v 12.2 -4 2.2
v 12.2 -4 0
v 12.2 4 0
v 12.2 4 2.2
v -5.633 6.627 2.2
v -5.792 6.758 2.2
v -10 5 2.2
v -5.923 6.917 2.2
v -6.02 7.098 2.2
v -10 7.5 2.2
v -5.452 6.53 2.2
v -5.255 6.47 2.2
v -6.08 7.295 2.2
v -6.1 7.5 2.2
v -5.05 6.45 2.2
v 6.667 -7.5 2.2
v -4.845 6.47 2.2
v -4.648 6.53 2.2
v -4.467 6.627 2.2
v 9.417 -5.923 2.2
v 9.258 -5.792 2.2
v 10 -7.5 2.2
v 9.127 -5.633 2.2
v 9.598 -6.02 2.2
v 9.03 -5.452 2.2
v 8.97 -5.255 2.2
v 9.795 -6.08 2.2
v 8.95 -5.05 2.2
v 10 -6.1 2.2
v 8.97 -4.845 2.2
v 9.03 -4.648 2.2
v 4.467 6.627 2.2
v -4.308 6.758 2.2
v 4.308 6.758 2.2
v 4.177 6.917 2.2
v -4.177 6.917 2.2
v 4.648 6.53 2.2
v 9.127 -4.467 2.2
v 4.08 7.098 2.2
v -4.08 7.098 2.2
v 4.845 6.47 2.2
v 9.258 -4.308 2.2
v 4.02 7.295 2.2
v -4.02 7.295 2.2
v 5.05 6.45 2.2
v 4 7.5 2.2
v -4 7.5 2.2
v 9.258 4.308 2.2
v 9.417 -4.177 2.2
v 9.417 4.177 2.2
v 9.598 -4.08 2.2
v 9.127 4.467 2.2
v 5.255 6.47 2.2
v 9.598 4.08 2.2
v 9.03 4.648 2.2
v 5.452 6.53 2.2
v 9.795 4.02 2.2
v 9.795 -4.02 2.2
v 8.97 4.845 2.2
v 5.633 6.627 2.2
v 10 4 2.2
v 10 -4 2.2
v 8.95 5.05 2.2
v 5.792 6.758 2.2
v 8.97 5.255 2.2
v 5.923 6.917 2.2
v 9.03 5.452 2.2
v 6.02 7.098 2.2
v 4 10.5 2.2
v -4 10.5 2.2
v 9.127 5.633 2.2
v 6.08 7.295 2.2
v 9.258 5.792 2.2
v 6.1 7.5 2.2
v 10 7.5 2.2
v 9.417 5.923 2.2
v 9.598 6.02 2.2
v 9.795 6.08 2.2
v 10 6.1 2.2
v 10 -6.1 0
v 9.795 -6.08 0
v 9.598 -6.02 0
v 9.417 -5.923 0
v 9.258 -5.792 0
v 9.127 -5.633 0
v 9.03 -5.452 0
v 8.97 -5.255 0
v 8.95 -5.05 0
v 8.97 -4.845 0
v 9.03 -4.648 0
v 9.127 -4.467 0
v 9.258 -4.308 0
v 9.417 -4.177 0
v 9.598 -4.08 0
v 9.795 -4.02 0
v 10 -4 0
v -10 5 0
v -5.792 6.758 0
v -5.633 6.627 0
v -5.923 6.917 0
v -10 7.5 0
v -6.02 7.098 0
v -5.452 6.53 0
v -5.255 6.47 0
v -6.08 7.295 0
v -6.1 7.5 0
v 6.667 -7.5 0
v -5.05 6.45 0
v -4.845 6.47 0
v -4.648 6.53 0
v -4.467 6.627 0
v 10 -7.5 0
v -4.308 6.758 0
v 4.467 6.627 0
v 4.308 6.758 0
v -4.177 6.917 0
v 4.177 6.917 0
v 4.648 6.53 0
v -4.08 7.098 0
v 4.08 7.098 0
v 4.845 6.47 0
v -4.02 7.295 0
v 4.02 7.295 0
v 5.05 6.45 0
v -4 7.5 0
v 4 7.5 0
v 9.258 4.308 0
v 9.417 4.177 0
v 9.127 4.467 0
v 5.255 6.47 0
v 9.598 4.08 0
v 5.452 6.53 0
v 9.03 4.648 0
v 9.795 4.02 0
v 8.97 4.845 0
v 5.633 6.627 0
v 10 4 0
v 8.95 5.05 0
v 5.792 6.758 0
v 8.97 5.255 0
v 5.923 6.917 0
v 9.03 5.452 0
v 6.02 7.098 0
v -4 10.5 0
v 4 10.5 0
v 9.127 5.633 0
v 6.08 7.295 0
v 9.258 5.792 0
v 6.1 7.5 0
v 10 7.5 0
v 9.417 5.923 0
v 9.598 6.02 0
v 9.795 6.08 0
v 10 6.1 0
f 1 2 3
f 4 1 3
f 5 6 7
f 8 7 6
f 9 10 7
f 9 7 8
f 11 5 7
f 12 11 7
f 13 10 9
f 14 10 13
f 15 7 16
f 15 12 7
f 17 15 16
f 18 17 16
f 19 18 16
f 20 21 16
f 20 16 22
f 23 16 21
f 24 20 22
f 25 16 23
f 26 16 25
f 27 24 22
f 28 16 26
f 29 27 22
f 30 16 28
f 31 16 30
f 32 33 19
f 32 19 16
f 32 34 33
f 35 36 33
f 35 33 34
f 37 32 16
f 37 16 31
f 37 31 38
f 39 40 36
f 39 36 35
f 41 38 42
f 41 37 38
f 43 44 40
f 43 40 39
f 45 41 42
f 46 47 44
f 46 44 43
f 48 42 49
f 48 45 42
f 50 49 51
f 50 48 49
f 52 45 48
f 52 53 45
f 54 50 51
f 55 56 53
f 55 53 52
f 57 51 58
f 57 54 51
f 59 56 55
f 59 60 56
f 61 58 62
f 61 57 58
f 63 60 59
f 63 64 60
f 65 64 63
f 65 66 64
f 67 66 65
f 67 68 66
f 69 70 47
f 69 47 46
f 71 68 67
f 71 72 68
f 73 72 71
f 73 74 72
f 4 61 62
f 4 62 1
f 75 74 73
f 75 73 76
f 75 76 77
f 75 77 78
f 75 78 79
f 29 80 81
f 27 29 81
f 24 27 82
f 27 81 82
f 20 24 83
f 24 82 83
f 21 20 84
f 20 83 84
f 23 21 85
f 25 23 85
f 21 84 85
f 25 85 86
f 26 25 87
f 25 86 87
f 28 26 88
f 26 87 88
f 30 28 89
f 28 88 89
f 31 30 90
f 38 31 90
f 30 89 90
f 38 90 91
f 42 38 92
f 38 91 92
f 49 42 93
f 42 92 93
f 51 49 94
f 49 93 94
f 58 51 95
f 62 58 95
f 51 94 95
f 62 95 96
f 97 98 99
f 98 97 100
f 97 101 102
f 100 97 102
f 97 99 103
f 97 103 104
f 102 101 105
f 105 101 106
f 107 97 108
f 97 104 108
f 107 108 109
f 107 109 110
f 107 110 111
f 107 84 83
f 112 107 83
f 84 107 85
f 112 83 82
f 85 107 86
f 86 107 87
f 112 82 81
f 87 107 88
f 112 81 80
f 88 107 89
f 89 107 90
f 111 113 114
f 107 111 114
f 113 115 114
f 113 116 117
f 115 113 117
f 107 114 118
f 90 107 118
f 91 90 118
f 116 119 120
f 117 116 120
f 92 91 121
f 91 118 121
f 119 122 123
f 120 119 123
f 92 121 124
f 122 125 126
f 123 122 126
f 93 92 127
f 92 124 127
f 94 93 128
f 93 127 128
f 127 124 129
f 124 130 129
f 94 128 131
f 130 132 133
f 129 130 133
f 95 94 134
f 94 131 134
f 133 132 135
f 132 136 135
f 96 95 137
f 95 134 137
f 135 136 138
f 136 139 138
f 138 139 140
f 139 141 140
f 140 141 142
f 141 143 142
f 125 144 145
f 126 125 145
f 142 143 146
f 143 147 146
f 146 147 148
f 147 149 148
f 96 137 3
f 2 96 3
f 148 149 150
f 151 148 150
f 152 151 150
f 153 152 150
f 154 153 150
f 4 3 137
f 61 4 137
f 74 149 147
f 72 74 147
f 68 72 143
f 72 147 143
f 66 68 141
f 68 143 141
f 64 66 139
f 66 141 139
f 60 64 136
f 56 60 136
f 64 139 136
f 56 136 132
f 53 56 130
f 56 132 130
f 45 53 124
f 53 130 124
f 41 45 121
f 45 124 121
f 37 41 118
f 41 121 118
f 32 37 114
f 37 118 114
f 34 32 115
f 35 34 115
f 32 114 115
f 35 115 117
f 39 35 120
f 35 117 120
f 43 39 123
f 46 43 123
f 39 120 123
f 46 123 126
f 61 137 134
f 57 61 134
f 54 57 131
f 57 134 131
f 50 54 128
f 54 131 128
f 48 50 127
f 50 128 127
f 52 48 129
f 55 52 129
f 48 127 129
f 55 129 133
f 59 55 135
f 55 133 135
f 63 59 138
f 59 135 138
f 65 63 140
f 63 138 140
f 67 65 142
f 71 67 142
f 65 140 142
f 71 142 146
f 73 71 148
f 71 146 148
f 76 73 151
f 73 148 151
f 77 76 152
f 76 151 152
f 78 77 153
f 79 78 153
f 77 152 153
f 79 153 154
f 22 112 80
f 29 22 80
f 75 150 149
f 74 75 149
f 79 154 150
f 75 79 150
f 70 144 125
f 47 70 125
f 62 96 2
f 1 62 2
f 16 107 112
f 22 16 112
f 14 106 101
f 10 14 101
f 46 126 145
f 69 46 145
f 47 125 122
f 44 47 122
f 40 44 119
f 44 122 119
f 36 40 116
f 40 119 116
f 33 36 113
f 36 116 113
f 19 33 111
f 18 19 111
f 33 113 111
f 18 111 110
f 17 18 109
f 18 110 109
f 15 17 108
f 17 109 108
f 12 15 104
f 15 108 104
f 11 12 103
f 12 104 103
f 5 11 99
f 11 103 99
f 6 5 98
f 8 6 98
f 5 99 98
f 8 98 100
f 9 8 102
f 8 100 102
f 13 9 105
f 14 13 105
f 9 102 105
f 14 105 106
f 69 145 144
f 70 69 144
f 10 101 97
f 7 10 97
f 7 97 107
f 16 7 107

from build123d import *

# Parameters (mm, degrees)
EXTRUDE_1_DEPTH = 2.2


with BuildPart() as part:
    # 草图1 → 凸台-拉伸1 (new body)
    with BuildSketch(Plane.XY):
        with BuildLine():
            Line((-4, 10.5), (-4, 7.5))
            ThreePointArc((-4, 7.5), (-5.05, 6.45), (-6.1, 7.5))
            Line((-6.1, 7.5), (-10, 7.5))
            Line((-10, 7.5), (-10, 5))
            Line((-10, 5), (6.666666667, -7.5))
            Line((6.666666667, -7.5), (10, -7.5))
            Line((10, -7.5), (10, -6.1))
            ThreePointArc((10, -6.1), (8.95, -5.05), (10, -4))
            Line((10, -4), (12.2, -4))
            Line((12.2, -4), (12.2, 4))
            Line((12.2, 4), (10, 4))
            ThreePointArc((10, 4), (8.95, 5.05), (10, 6.1))
            Line((10, 6.1), (10, 7.5))
            Line((10, 7.5), (6.1, 7.5))
            ThreePointArc((6.1, 7.5), (5.05, 6.45), (4, 7.5))
            Line((4, 7.5), (4, 10.5))
            Line((4, 10.5), (-4, 10.5))
        make_face()
    extrude(amount=EXTRUDE_1_DEPTH)


solid = part.part
